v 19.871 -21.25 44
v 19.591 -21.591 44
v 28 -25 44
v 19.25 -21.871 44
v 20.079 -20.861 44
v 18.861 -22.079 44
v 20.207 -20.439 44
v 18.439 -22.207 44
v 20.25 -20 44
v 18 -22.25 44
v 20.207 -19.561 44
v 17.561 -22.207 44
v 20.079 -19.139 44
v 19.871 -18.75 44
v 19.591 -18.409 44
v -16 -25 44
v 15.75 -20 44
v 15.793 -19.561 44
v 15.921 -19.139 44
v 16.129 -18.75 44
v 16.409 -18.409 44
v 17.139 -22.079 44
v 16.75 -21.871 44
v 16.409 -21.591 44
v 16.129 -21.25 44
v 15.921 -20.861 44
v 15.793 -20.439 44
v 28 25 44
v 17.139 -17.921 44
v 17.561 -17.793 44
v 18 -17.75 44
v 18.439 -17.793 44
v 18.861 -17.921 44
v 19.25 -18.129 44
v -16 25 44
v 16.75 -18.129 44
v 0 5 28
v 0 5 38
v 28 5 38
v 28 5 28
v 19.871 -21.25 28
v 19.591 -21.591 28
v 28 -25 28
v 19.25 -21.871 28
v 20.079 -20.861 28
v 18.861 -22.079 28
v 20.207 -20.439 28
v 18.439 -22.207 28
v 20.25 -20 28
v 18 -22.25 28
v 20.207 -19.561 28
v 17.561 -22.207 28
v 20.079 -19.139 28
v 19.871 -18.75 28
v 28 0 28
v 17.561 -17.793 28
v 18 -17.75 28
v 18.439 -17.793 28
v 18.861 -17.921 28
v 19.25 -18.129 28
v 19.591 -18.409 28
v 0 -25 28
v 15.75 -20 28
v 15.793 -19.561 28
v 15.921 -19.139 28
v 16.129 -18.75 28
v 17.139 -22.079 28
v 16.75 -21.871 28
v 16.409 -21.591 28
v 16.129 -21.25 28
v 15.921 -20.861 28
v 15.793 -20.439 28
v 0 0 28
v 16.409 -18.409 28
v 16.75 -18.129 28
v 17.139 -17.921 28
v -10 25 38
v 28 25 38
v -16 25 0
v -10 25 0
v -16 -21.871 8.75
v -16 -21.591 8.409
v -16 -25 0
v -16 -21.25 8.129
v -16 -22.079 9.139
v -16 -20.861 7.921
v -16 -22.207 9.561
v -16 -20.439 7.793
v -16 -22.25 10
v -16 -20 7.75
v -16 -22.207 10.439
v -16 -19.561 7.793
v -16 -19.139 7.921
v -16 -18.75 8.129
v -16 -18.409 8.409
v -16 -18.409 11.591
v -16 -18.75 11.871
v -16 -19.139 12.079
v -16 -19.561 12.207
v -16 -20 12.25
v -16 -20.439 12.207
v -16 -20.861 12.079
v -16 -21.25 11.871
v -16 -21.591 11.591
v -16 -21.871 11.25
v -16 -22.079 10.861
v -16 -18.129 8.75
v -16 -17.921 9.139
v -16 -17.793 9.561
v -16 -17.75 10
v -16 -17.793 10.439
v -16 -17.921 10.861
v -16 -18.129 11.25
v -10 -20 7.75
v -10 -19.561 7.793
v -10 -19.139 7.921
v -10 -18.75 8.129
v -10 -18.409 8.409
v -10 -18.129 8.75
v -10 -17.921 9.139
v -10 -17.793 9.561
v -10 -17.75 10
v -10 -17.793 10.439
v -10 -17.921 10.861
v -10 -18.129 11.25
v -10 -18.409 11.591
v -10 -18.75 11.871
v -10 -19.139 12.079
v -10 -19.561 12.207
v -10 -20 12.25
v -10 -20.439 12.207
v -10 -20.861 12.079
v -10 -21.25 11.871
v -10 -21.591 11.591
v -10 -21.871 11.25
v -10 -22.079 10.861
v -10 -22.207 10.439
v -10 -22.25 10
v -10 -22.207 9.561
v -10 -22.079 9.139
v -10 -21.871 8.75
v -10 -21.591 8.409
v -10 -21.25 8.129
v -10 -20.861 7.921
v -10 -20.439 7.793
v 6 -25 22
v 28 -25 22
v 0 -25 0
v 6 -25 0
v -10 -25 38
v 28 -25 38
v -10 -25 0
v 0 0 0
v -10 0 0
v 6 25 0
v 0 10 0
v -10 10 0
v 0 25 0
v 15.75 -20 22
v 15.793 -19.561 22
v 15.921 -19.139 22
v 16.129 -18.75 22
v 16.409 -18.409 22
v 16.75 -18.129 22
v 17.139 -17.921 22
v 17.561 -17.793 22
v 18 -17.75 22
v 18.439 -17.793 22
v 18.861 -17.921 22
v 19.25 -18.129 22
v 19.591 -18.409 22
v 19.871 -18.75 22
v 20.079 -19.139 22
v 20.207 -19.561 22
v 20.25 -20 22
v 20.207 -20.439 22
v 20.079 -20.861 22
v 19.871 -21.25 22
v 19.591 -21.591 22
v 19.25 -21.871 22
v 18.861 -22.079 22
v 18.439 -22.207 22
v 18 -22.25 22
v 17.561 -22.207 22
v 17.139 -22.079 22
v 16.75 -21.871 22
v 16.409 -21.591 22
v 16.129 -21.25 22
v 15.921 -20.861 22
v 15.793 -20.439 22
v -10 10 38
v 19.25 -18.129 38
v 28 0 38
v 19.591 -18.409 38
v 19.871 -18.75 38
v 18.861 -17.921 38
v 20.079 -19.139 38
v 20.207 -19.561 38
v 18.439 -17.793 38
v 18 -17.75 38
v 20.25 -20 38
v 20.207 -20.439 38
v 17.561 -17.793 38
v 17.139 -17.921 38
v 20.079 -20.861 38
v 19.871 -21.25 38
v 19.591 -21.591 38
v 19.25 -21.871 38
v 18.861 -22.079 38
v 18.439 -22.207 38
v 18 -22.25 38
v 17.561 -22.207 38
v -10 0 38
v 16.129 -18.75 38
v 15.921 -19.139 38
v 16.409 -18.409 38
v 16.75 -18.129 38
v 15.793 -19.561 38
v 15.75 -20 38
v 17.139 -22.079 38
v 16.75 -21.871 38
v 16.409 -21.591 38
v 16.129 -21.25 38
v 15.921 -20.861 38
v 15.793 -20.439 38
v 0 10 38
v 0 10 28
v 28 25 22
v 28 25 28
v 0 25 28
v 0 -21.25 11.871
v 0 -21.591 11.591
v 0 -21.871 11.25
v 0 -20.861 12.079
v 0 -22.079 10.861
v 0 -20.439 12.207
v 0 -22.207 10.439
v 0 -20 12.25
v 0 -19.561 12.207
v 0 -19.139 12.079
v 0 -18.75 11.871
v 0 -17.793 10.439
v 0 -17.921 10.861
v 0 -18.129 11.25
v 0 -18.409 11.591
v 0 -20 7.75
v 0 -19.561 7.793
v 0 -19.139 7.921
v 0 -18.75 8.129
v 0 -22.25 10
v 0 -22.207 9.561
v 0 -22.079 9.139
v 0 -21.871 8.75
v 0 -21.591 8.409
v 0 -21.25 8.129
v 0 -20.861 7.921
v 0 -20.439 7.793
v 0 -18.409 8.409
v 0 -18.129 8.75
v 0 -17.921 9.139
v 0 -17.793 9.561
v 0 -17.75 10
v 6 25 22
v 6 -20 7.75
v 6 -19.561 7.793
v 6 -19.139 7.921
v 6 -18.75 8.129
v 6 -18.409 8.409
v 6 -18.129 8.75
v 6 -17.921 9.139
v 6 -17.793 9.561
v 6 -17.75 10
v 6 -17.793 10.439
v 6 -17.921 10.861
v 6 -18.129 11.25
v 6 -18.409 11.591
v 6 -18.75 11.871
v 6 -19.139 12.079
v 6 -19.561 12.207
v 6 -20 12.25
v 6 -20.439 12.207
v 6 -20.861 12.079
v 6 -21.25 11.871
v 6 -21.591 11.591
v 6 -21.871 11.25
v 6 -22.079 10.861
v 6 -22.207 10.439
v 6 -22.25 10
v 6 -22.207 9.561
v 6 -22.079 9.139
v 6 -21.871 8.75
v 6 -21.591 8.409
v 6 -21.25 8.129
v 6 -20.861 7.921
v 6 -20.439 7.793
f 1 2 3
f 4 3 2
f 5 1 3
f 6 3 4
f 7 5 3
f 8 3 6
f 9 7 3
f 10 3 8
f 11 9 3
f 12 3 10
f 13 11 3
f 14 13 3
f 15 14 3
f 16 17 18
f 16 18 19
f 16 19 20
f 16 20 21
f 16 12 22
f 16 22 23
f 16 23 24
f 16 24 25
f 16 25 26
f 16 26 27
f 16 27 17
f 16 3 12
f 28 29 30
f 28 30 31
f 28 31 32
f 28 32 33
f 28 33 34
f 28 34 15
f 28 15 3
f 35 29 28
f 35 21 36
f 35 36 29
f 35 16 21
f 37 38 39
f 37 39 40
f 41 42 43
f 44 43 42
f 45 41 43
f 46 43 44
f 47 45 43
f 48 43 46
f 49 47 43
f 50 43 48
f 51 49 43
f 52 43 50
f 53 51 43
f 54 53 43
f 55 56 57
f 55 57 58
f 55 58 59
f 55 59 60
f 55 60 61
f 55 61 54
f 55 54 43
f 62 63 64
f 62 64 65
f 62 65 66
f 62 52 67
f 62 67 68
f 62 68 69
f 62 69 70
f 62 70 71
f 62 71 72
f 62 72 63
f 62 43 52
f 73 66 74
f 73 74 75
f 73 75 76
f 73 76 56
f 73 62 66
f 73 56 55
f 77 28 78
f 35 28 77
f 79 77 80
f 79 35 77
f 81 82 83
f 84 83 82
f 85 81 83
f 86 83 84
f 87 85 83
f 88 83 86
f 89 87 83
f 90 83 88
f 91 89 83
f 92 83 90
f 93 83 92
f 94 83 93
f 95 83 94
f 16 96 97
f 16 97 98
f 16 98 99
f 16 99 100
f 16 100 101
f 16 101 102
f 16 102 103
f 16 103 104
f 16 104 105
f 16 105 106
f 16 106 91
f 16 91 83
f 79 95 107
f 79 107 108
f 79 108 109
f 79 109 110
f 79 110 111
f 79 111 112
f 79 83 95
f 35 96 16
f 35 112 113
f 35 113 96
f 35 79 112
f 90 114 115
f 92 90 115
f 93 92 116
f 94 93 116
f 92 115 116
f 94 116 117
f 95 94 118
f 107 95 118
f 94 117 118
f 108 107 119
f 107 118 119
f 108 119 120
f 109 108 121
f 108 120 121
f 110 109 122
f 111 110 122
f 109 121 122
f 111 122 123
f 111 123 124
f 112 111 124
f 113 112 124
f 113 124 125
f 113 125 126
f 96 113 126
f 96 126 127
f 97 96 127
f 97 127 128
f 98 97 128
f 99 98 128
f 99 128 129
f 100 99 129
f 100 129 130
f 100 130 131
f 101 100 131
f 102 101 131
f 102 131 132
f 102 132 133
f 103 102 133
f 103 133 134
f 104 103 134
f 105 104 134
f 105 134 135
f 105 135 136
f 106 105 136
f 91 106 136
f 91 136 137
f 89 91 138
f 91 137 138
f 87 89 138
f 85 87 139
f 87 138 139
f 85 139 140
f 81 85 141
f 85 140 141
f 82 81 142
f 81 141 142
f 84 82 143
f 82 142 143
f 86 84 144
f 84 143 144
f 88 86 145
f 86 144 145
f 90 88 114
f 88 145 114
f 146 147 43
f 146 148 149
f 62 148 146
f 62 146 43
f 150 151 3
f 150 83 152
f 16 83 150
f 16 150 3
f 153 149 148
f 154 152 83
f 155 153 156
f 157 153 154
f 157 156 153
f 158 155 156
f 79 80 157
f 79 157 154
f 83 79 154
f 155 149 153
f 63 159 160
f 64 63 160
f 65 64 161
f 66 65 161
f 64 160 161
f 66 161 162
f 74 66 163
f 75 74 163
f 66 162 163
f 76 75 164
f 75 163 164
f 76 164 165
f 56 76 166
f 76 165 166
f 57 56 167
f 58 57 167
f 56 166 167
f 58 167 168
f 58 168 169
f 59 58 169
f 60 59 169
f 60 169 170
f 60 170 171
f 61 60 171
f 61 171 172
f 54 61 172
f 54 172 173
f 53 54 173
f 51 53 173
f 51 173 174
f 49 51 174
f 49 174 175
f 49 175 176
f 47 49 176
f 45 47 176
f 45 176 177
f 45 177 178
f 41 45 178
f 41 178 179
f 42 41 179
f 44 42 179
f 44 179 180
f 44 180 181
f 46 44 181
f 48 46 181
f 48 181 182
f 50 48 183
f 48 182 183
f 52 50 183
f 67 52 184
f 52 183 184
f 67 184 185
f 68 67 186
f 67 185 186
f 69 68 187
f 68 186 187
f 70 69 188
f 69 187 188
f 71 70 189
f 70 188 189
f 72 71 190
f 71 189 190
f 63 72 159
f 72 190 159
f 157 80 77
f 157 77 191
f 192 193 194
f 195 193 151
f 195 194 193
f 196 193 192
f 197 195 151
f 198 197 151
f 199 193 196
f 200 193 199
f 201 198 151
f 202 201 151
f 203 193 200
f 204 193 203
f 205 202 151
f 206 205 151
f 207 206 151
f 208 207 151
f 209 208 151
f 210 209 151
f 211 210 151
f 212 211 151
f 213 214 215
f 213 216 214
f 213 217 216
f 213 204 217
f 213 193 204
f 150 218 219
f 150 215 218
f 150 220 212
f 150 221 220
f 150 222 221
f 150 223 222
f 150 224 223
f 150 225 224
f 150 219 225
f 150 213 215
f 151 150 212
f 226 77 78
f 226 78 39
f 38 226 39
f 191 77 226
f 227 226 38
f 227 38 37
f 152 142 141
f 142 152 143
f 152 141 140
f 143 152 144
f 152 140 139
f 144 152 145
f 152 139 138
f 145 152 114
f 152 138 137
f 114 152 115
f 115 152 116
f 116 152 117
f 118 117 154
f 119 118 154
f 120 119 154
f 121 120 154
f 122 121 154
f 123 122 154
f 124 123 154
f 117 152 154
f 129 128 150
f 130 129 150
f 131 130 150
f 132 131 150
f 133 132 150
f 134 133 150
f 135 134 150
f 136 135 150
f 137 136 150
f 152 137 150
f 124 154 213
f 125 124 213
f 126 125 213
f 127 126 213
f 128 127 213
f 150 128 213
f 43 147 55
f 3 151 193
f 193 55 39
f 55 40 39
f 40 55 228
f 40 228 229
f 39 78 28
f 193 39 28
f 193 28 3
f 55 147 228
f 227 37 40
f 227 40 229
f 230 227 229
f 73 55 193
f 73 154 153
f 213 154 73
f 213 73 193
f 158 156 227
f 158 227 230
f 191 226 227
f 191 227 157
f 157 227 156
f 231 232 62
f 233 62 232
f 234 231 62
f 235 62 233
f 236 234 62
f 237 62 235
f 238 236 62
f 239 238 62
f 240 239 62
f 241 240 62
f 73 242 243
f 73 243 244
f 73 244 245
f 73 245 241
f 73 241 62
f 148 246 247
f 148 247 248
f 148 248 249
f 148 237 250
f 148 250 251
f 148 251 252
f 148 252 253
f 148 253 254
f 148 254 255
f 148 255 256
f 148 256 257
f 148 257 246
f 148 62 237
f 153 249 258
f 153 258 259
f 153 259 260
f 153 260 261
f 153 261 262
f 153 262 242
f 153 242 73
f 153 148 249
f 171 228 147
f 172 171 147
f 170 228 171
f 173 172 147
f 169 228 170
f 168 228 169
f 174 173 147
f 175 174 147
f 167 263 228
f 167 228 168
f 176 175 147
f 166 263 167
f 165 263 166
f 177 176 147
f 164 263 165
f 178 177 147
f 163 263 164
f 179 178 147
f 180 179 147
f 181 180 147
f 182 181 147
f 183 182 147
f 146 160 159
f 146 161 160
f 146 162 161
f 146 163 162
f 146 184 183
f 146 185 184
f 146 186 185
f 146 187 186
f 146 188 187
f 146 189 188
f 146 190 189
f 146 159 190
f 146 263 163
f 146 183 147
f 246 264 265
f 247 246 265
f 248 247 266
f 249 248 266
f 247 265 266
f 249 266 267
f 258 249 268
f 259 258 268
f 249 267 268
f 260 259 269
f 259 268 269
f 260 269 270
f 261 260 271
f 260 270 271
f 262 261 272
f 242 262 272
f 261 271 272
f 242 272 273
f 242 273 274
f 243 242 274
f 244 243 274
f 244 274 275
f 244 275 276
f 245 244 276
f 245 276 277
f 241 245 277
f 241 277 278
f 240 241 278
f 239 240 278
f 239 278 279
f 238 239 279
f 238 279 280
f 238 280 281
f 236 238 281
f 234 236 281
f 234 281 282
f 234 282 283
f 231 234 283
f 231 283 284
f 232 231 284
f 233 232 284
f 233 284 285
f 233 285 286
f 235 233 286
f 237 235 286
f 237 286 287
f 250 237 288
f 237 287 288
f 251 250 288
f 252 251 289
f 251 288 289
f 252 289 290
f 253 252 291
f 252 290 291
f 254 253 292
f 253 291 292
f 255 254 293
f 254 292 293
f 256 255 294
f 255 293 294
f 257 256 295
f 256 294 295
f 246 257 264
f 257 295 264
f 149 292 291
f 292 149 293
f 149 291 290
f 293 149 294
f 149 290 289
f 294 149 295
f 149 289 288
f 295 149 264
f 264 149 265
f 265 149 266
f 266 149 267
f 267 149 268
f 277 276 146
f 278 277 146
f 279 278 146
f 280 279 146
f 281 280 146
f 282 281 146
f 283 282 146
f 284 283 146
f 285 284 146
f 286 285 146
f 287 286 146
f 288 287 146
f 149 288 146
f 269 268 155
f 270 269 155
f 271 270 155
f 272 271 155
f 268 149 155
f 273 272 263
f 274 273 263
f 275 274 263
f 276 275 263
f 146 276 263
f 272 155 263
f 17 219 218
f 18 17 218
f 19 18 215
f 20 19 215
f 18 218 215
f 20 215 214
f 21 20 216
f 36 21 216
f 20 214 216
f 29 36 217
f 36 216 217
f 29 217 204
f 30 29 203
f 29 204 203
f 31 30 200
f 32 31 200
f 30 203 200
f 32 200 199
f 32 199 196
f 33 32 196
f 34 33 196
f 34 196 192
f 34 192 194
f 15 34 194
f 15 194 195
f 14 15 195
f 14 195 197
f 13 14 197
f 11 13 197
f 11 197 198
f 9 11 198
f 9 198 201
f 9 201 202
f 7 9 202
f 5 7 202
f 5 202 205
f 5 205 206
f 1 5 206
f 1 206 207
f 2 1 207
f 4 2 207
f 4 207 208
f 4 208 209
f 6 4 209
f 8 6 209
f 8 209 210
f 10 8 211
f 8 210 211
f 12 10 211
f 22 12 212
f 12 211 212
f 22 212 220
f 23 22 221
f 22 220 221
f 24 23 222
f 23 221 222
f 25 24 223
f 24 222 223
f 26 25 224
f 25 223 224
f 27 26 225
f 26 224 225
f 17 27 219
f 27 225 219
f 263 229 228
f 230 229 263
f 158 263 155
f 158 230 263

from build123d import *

# Parameters (mm, degrees)
ESTRUSIONE_ESTRUSIONE1_DEPTH = 28
ESTRUSIONE_ESTRUSIONE2_DEPTH = 16
SCHIZZO4_W                   = 16
SCHIZZO4_H                   = 50
ESTRUSIONE_ESTRUSIONE3_DEPTH = 6
ESTRUSIONE_ESTRUSIONE4_DEPTH = 22
FORO_PER_VITE_M4_1_D         = 4.5
FORO_PER_VITE_M4_1_DEPTH     = 30
FORO_PER_VITE_M4_1_TIP       = 1.351936393
FORO_PER_VITE_M4_2_D         = 4.5
FORO_PER_VITE_M4_2_DEPTH     = 30
FORO_PER_VITE_M4_2_TIP       = 1.351936393
SCHIZZO10_W                  = 10
SCHIZZO10_H                  = 5
TAGLIO_ESTRUSIONE1_DEPTH     = 6


with BuildPart() as part:
    # Schizzo2 → Estrusione-Estrusione1 (new body)
    with BuildSketch(Plane.XY):
        Polygon((0, 0), (-10, 0), (-10, -25), (-16, -25), (-16, 25), (-10, 25), (-10, 10), (0, 10), (0, 25), (6, 25), (6, -25), (0, -25), align=None)
    extrude(amount=ESTRUSIONE_ESTRUSIONE1_DEPTH)

    # Schizzo3 → Estrusione-Estrusione2 (add)
    with BuildSketch(Plane(origin=(6, 0, 0), x_dir=(0, 0, -1), z_dir=(1, 0, 0))):
        Polygon((-28, 0), (-38, 0), (-38, -25), (-44, -25), (-44, 25), (-38, 25), (-38, 10), (-28, 10), align=None)
    extrude(amount=-ESTRUSIONE_ESTRUSIONE2_DEPTH)

    # Schizzo4 → Estrusione-Estrusione3 (add)
    with BuildSketch(Plane.ZY.offset(10)):
        with Locations((36, 0)):
            Rectangle(SCHIZZO4_W, SCHIZZO4_H)
    extrude(amount=ESTRUSIONE_ESTRUSIONE3_DEPTH)

    # Schizzo5 → Estrusione-Estrusione4 (add)
    with BuildSketch(Plane(origin=(6, 0, 0), x_dir=(0, 0, -1), z_dir=(1, 0, 0))):
        Polygon((-38, -25), (-44, -25), (-44, 25), (-38, 25), (-38, 5), (-28, 5), (-28, 25), (-22, 25), (-22, -25), (-28, -25), (-28, 0), (-38, 0), align=None)
    extrude(amount=ESTRUSIONE_ESTRUSIONE4_DEPTH)

    # Foro per Vite M4-1
    with Locations(Plane.XY.offset(44)):
        with Locations((18, -20)):
            Hole(FORO_PER_VITE_M4_1_D / 2, depth=FORO_PER_VITE_M4_1_DEPTH)
            with Locations((0, 0, -(FORO_PER_VITE_M4_1_DEPTH + FORO_PER_VITE_M4_1_TIP / 2))):  # 118° drill point
                Cone(0, FORO_PER_VITE_M4_1_D / 2, FORO_PER_VITE_M4_1_TIP, mode=Mode.SUBTRACT)

    # Foro per Vite M4-2
    with Locations(Plane.ZY.offset(16)):
        with Locations((10, -20)):
            Hole(FORO_PER_VITE_M4_2_D / 2, depth=FORO_PER_VITE_M4_2_DEPTH)
            with Locations((0, 0, -(FORO_PER_VITE_M4_2_DEPTH + FORO_PER_VITE_M4_2_TIP / 2))):  # 118° drill point
                Cone(0, FORO_PER_VITE_M4_2_D / 2, FORO_PER_VITE_M4_2_TIP, mode=Mode.SUBTRACT)

    # Schizzo10 → Taglio-Estrusione1 (cut)
    with BuildSketch(Plane(origin=(6, 0, 0), x_dir=(0, 0, -1), z_dir=(1, 0, 0))):
        with Locations((-33, 7.5)):
            Rectangle(SCHIZZO10_W, SCHIZZO10_H)
    extrude(amount=-TAGLIO_ESTRUSIONE1_DEPTH, mode=Mode.SUBTRACT)


solid = part.part
